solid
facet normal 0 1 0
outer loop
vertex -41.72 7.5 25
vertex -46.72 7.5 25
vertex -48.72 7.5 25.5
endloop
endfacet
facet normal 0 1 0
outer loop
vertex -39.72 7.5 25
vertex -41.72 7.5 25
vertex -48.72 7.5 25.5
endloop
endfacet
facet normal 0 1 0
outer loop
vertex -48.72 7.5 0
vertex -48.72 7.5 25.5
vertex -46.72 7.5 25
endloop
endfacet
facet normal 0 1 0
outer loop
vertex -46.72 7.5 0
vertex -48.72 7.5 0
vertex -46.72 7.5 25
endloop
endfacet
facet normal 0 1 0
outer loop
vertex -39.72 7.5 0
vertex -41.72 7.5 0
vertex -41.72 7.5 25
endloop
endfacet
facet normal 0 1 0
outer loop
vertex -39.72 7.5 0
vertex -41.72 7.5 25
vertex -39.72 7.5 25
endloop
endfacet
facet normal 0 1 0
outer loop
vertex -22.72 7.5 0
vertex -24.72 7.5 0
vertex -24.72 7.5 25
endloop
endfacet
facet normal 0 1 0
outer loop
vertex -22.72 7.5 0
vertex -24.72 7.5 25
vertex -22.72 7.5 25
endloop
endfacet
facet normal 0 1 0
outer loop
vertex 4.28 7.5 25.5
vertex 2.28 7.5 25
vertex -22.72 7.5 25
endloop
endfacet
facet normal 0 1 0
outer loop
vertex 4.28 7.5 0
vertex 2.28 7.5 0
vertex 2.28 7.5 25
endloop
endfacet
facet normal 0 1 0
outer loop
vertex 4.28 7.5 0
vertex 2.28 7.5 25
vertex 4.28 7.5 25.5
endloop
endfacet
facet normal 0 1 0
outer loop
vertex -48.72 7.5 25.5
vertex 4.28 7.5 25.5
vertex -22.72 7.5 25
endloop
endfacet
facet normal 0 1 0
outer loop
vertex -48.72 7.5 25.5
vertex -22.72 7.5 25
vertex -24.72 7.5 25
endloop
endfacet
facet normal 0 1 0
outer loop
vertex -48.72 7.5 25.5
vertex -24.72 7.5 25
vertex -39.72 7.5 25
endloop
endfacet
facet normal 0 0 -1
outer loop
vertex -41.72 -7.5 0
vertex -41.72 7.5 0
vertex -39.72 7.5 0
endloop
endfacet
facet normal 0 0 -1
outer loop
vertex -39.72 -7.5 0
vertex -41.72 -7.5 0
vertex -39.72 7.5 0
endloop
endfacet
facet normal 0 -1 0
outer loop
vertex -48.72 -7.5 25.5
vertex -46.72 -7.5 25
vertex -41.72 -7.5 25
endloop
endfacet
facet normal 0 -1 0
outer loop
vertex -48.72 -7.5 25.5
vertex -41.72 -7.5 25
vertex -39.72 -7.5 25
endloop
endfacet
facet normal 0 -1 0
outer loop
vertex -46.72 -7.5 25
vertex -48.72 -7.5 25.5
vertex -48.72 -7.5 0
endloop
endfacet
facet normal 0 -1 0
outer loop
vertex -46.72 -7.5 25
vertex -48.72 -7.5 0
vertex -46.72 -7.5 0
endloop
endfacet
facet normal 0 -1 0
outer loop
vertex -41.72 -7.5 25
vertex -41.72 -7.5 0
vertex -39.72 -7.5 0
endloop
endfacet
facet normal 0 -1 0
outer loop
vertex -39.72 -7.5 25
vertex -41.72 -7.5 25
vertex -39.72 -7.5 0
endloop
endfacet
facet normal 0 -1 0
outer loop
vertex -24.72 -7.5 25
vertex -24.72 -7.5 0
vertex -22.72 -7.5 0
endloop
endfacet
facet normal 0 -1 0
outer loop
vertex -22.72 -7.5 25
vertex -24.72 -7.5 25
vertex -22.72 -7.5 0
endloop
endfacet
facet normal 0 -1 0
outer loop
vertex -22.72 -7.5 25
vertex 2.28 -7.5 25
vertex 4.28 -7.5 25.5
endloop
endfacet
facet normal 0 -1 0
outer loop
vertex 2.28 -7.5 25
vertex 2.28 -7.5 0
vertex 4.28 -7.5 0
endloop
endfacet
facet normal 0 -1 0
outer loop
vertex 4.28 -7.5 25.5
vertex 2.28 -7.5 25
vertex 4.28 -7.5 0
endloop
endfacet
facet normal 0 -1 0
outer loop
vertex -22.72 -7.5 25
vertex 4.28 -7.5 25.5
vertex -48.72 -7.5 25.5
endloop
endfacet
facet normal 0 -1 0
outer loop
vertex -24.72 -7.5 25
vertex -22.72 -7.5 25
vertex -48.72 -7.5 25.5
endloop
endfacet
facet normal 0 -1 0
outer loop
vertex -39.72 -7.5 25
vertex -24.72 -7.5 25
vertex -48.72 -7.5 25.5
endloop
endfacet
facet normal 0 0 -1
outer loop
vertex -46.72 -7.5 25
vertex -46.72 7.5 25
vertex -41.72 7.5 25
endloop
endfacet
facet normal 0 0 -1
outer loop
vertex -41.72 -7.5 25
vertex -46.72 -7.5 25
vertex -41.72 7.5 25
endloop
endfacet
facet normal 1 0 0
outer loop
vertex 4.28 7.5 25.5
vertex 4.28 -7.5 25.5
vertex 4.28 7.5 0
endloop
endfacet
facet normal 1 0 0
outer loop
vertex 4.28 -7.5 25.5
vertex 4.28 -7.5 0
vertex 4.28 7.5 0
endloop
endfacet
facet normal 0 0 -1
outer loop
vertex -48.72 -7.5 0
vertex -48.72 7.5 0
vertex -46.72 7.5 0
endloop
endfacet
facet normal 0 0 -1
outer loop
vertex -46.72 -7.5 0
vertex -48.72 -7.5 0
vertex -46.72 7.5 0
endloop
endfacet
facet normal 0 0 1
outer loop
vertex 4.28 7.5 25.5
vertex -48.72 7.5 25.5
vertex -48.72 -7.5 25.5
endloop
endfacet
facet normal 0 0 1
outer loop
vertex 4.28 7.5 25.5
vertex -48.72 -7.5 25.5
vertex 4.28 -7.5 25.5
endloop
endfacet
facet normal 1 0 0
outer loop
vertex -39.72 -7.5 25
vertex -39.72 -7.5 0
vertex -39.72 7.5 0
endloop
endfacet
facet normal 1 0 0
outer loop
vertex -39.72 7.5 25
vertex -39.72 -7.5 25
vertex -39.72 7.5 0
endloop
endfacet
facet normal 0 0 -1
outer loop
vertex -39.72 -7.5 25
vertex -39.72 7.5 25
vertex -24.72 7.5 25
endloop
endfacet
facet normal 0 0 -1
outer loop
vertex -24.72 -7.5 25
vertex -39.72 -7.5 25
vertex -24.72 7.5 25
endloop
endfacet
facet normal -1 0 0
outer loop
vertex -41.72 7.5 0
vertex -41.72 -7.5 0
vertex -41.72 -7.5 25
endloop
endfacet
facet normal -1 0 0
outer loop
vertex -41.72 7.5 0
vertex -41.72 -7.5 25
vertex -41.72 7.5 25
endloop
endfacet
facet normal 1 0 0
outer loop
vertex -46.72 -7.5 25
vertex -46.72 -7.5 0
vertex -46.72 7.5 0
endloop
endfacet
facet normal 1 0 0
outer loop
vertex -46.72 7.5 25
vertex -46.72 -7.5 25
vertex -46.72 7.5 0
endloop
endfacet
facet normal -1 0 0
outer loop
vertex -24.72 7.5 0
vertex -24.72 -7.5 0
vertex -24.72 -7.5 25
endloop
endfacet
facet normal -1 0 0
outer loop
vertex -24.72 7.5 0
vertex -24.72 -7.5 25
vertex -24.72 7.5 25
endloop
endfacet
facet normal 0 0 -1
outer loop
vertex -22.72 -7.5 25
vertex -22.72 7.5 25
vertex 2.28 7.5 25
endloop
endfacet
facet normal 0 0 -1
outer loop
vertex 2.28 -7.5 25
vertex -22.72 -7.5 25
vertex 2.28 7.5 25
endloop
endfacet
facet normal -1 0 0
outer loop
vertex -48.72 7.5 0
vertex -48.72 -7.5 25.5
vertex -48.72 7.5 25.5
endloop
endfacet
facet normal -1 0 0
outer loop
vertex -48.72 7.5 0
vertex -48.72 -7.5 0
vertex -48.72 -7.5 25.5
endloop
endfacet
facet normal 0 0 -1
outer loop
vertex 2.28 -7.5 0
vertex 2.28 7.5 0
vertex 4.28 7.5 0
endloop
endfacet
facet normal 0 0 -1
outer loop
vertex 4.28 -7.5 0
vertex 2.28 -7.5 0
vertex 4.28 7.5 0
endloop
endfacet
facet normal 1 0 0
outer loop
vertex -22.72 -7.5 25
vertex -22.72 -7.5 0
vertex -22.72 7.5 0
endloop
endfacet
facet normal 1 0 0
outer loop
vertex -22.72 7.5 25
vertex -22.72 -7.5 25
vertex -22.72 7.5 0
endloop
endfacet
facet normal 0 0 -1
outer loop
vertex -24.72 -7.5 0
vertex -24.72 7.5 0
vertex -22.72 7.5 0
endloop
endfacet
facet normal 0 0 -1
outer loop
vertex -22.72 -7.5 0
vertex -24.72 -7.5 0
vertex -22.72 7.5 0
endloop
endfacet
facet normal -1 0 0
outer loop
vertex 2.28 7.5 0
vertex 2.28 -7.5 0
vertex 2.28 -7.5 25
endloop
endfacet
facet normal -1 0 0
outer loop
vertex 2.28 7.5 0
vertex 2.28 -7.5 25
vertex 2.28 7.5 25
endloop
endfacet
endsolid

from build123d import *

# Parameters (mm, degrees)
F0_W     = 2
F0_H     = 15
F1_DEPTH = 25
F2_W     = 53
F2_H     = 15
F3_DEPTH = 0.5


with BuildPart() as f1:
    # F0 (on Top) → F1 (new body)
    with BuildSketch(Plane.XY):
        with Locations((-47.719786, 0)):
            Rectangle(F0_W, F0_H)
        with Locations((-40.719786, 0)):
            Rectangle(F0_W, F0_H)
        with Locations((-23.719786, 0)):
            Rectangle(F0_W, F0_H)
        with Locations((3.280214, 0)):
            Rectangle(F0_W, F0_H)
    extrude(amount=F1_DEPTH)

    # F2 (on face) → F3 (join)
    with BuildSketch(Plane.XY.offset(25)):
        with Locations((-22.219786, 0)):
            Rectangle(F2_W, F2_H)
    extrude(amount=F3_DEPTH)


solid = f1.part
